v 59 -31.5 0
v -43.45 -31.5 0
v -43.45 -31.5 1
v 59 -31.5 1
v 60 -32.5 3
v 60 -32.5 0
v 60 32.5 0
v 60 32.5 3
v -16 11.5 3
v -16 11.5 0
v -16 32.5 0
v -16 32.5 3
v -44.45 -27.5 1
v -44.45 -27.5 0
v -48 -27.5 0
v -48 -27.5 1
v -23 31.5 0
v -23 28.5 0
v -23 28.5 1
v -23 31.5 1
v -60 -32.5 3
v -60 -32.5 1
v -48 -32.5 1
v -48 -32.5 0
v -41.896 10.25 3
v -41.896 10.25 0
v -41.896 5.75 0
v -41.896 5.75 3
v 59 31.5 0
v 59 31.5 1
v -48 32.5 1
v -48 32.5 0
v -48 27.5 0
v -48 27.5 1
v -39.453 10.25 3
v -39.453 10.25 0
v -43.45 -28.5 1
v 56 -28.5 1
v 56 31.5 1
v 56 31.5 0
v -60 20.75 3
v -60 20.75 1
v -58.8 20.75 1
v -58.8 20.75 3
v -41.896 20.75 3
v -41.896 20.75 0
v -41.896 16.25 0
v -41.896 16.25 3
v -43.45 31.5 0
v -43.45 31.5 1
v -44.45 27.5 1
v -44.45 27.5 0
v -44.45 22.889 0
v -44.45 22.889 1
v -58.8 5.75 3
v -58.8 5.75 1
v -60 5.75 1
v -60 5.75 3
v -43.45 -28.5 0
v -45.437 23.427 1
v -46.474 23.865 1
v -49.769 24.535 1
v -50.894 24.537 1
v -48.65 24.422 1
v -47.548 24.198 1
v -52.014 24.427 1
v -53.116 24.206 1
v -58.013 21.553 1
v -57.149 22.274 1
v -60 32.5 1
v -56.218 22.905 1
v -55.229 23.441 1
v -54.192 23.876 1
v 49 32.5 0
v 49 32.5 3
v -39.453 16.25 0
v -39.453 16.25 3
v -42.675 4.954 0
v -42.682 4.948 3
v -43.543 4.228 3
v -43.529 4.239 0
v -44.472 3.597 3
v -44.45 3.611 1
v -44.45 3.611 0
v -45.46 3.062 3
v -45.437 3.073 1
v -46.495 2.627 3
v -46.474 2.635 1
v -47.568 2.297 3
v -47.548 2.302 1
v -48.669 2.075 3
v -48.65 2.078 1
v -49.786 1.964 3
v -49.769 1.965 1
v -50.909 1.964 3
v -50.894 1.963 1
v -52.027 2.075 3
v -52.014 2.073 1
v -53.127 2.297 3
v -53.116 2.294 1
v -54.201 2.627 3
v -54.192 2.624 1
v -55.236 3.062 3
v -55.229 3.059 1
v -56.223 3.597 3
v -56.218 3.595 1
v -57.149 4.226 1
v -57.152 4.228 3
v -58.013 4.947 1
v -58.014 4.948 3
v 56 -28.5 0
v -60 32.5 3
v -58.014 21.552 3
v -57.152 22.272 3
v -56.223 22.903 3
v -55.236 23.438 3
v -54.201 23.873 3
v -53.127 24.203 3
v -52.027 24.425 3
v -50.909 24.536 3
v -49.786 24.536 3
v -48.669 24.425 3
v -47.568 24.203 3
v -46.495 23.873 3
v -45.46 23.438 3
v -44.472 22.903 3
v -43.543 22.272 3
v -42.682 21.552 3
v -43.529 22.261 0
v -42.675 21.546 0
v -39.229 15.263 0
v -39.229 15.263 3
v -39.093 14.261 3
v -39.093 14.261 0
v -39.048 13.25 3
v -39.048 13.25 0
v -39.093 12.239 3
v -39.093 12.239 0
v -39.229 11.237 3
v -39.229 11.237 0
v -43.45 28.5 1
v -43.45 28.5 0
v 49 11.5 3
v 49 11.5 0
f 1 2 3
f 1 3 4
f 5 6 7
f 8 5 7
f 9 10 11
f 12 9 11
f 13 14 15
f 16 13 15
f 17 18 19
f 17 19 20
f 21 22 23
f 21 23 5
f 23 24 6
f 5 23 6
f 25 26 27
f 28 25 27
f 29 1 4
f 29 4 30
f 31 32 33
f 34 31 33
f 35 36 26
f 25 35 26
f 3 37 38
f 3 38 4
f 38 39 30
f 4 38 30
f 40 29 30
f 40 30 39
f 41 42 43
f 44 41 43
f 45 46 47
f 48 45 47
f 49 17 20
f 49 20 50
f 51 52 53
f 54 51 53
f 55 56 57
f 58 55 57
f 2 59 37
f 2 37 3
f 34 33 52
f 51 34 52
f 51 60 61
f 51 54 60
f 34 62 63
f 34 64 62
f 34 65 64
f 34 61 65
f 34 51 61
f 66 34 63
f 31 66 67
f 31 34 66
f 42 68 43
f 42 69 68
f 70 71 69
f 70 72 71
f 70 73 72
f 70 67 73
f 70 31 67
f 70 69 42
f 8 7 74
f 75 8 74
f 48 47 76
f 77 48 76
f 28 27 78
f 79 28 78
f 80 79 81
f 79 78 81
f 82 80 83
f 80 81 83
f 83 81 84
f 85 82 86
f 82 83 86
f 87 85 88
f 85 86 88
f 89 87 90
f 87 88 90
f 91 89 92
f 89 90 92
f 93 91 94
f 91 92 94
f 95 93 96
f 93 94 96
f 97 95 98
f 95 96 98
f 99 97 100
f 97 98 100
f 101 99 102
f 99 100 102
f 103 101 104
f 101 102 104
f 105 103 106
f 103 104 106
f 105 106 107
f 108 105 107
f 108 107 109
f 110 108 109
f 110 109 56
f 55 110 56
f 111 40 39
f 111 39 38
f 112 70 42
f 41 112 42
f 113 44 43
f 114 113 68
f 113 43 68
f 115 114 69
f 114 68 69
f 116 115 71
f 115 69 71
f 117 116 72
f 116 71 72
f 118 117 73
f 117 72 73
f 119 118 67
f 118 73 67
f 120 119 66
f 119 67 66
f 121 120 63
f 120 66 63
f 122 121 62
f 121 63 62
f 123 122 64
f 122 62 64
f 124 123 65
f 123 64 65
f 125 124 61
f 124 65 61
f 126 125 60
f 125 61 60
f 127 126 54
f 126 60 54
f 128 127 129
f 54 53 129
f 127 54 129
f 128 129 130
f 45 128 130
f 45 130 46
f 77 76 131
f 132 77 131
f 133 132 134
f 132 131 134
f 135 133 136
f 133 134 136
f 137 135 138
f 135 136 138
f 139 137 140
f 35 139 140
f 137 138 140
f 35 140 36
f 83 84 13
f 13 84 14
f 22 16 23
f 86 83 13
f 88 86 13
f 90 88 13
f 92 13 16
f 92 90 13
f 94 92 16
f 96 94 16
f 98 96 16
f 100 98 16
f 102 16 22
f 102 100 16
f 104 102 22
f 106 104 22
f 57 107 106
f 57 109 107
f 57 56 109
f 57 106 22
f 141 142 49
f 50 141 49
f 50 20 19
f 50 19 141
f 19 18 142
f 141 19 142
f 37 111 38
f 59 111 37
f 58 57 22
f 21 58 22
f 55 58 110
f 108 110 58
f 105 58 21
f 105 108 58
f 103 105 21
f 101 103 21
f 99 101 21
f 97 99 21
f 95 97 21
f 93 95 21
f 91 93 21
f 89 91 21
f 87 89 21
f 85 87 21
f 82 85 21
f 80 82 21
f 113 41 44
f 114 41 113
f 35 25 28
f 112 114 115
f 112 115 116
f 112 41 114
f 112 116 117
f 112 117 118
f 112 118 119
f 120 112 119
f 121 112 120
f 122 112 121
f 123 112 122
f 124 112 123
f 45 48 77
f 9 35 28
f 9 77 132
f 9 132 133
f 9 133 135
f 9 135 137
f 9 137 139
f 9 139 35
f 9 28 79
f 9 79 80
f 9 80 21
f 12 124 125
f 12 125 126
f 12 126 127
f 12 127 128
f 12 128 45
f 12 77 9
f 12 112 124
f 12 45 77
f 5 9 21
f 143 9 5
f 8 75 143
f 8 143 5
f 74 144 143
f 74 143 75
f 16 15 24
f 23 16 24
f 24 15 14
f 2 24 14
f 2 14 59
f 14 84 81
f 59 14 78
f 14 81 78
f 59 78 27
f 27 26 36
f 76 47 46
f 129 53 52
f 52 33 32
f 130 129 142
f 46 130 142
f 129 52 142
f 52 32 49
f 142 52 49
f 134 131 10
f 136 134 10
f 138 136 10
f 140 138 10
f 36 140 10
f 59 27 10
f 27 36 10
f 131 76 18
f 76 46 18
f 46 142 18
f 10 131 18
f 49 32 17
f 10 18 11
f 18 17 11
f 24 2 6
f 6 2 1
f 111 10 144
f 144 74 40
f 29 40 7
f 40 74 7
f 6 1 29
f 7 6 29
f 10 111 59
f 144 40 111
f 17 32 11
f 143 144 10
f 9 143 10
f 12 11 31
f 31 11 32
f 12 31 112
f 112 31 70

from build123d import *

# Parameters (mm, degrees)
P_IDAT_VYSUNUT_M1_DEPTH  = 3
SKICA3_W                 = 20.45
SKICA3_H                 = 3
ODEBRAT_VYSUNUT_M1_DEPTH = 1
ODEBRAT_VYSUNUT_M2_DEPTH = 1
ODEBRAT_VYSUNUT_M3_DEPTH = 1
SKICA6_W                 = 65
SKICA6_H                 = 21
ODEBRAT_VYSUNUT_M4_DEPTH = 69.302635381


with BuildPart() as part:
    # Skica2 → Přidat vysunutím1 (new body)
    with BuildSketch(Plane.XY):
        with BuildLine():
            Line((-60, 20.75), (-58.8, 20.75))
            ThreePointArc((-58.8, 20.75), (-50.347781356, 24.55), (-41.895562713, 20.75))
            Line((-41.895562713, 20.75), (-41.895562713, 16.25))
            Line((-41.895562713, 16.25), (-39.453287334, 16.25))
            ThreePointArc((-39.453287334, 16.25), (-39.047781356, 13.25), (-39.453287334, 10.25))
            Line((-39.453287334, 10.25), (-41.895562713, 10.25))
            Line((-41.895562713, 10.25), (-41.895562713, 5.75))
            ThreePointArc((-41.895562713, 5.75), (-50.347781356, 1.95), (-58.8, 5.75))
            Line((-58.8, 5.75), (-60, 5.75))
            Line((-60, 5.75), (-60, -32.5))
            Line((-60, -32.5), (60, -32.5))
            Line((60, -32.5), (60, 32.5))
            Line((60, 32.5), (-60, 32.5))
            Line((-60, 32.5), (-60, 20.75))
        make_face()
    extrude(amount=P_IDAT_VYSUNUT_M1_DEPTH)

    # Skica3 → Odebrat vysunutím1 (cut)
    with BuildSketch(Plane(origin=(0, 0, 0), x_dir=(-1, 0, 0), z_dir=(0, 0, -1))):
        with Locations((33.225, 30)):
            Rectangle(SKICA3_W, SKICA3_H)
    extrude(amount=-ODEBRAT_VYSUNUT_M1_DEPTH, mode=Mode.SUBTRACT)

    # Skica4 → Odebrat vysunutím2 (cut)
    with BuildSketch(Plane(origin=(0, 0, 0), x_dir=(-1, 0, 0), z_dir=(0, 0, -1))):
        Polygon((-59, 31.5), (-56, 31.5), (-56, -28.5), (43.45, -28.5), (43.45, -31.5), (-59, -31.5), align=None)
    extrude(amount=-ODEBRAT_VYSUNUT_M2_DEPTH, mode=Mode.SUBTRACT)

    # Skica5 → Odebrat vysunutím3 (cut)
    with BuildSketch(Plane(origin=(0, 0, 0), x_dir=(-1, 0, 0), z_dir=(0, 0, -1))):
        Polygon((60, 32.5), (48, 32.5), (48, 27.5), (44.45, 27.5), (44.45, -27.5), (48, -27.5), (48, -32.5), (60, -32.5), align=None)
    extrude(amount=-ODEBRAT_VYSUNUT_M3_DEPTH, mode=Mode.SUBTRACT)

    # Skica6 → Odebrat vysunutím4 (cut, through all)
    with BuildSketch(Plane(origin=(0, 0, 0), x_dir=(-1, 0, 0), z_dir=(0, 0, -1))):
        with Locations((-16.5, 22)):
            Rectangle(SKICA6_W, SKICA6_H)
    extrude(amount=-ODEBRAT_VYSUNUT_M4_DEPTH, mode=Mode.SUBTRACT)


solid = part.part
